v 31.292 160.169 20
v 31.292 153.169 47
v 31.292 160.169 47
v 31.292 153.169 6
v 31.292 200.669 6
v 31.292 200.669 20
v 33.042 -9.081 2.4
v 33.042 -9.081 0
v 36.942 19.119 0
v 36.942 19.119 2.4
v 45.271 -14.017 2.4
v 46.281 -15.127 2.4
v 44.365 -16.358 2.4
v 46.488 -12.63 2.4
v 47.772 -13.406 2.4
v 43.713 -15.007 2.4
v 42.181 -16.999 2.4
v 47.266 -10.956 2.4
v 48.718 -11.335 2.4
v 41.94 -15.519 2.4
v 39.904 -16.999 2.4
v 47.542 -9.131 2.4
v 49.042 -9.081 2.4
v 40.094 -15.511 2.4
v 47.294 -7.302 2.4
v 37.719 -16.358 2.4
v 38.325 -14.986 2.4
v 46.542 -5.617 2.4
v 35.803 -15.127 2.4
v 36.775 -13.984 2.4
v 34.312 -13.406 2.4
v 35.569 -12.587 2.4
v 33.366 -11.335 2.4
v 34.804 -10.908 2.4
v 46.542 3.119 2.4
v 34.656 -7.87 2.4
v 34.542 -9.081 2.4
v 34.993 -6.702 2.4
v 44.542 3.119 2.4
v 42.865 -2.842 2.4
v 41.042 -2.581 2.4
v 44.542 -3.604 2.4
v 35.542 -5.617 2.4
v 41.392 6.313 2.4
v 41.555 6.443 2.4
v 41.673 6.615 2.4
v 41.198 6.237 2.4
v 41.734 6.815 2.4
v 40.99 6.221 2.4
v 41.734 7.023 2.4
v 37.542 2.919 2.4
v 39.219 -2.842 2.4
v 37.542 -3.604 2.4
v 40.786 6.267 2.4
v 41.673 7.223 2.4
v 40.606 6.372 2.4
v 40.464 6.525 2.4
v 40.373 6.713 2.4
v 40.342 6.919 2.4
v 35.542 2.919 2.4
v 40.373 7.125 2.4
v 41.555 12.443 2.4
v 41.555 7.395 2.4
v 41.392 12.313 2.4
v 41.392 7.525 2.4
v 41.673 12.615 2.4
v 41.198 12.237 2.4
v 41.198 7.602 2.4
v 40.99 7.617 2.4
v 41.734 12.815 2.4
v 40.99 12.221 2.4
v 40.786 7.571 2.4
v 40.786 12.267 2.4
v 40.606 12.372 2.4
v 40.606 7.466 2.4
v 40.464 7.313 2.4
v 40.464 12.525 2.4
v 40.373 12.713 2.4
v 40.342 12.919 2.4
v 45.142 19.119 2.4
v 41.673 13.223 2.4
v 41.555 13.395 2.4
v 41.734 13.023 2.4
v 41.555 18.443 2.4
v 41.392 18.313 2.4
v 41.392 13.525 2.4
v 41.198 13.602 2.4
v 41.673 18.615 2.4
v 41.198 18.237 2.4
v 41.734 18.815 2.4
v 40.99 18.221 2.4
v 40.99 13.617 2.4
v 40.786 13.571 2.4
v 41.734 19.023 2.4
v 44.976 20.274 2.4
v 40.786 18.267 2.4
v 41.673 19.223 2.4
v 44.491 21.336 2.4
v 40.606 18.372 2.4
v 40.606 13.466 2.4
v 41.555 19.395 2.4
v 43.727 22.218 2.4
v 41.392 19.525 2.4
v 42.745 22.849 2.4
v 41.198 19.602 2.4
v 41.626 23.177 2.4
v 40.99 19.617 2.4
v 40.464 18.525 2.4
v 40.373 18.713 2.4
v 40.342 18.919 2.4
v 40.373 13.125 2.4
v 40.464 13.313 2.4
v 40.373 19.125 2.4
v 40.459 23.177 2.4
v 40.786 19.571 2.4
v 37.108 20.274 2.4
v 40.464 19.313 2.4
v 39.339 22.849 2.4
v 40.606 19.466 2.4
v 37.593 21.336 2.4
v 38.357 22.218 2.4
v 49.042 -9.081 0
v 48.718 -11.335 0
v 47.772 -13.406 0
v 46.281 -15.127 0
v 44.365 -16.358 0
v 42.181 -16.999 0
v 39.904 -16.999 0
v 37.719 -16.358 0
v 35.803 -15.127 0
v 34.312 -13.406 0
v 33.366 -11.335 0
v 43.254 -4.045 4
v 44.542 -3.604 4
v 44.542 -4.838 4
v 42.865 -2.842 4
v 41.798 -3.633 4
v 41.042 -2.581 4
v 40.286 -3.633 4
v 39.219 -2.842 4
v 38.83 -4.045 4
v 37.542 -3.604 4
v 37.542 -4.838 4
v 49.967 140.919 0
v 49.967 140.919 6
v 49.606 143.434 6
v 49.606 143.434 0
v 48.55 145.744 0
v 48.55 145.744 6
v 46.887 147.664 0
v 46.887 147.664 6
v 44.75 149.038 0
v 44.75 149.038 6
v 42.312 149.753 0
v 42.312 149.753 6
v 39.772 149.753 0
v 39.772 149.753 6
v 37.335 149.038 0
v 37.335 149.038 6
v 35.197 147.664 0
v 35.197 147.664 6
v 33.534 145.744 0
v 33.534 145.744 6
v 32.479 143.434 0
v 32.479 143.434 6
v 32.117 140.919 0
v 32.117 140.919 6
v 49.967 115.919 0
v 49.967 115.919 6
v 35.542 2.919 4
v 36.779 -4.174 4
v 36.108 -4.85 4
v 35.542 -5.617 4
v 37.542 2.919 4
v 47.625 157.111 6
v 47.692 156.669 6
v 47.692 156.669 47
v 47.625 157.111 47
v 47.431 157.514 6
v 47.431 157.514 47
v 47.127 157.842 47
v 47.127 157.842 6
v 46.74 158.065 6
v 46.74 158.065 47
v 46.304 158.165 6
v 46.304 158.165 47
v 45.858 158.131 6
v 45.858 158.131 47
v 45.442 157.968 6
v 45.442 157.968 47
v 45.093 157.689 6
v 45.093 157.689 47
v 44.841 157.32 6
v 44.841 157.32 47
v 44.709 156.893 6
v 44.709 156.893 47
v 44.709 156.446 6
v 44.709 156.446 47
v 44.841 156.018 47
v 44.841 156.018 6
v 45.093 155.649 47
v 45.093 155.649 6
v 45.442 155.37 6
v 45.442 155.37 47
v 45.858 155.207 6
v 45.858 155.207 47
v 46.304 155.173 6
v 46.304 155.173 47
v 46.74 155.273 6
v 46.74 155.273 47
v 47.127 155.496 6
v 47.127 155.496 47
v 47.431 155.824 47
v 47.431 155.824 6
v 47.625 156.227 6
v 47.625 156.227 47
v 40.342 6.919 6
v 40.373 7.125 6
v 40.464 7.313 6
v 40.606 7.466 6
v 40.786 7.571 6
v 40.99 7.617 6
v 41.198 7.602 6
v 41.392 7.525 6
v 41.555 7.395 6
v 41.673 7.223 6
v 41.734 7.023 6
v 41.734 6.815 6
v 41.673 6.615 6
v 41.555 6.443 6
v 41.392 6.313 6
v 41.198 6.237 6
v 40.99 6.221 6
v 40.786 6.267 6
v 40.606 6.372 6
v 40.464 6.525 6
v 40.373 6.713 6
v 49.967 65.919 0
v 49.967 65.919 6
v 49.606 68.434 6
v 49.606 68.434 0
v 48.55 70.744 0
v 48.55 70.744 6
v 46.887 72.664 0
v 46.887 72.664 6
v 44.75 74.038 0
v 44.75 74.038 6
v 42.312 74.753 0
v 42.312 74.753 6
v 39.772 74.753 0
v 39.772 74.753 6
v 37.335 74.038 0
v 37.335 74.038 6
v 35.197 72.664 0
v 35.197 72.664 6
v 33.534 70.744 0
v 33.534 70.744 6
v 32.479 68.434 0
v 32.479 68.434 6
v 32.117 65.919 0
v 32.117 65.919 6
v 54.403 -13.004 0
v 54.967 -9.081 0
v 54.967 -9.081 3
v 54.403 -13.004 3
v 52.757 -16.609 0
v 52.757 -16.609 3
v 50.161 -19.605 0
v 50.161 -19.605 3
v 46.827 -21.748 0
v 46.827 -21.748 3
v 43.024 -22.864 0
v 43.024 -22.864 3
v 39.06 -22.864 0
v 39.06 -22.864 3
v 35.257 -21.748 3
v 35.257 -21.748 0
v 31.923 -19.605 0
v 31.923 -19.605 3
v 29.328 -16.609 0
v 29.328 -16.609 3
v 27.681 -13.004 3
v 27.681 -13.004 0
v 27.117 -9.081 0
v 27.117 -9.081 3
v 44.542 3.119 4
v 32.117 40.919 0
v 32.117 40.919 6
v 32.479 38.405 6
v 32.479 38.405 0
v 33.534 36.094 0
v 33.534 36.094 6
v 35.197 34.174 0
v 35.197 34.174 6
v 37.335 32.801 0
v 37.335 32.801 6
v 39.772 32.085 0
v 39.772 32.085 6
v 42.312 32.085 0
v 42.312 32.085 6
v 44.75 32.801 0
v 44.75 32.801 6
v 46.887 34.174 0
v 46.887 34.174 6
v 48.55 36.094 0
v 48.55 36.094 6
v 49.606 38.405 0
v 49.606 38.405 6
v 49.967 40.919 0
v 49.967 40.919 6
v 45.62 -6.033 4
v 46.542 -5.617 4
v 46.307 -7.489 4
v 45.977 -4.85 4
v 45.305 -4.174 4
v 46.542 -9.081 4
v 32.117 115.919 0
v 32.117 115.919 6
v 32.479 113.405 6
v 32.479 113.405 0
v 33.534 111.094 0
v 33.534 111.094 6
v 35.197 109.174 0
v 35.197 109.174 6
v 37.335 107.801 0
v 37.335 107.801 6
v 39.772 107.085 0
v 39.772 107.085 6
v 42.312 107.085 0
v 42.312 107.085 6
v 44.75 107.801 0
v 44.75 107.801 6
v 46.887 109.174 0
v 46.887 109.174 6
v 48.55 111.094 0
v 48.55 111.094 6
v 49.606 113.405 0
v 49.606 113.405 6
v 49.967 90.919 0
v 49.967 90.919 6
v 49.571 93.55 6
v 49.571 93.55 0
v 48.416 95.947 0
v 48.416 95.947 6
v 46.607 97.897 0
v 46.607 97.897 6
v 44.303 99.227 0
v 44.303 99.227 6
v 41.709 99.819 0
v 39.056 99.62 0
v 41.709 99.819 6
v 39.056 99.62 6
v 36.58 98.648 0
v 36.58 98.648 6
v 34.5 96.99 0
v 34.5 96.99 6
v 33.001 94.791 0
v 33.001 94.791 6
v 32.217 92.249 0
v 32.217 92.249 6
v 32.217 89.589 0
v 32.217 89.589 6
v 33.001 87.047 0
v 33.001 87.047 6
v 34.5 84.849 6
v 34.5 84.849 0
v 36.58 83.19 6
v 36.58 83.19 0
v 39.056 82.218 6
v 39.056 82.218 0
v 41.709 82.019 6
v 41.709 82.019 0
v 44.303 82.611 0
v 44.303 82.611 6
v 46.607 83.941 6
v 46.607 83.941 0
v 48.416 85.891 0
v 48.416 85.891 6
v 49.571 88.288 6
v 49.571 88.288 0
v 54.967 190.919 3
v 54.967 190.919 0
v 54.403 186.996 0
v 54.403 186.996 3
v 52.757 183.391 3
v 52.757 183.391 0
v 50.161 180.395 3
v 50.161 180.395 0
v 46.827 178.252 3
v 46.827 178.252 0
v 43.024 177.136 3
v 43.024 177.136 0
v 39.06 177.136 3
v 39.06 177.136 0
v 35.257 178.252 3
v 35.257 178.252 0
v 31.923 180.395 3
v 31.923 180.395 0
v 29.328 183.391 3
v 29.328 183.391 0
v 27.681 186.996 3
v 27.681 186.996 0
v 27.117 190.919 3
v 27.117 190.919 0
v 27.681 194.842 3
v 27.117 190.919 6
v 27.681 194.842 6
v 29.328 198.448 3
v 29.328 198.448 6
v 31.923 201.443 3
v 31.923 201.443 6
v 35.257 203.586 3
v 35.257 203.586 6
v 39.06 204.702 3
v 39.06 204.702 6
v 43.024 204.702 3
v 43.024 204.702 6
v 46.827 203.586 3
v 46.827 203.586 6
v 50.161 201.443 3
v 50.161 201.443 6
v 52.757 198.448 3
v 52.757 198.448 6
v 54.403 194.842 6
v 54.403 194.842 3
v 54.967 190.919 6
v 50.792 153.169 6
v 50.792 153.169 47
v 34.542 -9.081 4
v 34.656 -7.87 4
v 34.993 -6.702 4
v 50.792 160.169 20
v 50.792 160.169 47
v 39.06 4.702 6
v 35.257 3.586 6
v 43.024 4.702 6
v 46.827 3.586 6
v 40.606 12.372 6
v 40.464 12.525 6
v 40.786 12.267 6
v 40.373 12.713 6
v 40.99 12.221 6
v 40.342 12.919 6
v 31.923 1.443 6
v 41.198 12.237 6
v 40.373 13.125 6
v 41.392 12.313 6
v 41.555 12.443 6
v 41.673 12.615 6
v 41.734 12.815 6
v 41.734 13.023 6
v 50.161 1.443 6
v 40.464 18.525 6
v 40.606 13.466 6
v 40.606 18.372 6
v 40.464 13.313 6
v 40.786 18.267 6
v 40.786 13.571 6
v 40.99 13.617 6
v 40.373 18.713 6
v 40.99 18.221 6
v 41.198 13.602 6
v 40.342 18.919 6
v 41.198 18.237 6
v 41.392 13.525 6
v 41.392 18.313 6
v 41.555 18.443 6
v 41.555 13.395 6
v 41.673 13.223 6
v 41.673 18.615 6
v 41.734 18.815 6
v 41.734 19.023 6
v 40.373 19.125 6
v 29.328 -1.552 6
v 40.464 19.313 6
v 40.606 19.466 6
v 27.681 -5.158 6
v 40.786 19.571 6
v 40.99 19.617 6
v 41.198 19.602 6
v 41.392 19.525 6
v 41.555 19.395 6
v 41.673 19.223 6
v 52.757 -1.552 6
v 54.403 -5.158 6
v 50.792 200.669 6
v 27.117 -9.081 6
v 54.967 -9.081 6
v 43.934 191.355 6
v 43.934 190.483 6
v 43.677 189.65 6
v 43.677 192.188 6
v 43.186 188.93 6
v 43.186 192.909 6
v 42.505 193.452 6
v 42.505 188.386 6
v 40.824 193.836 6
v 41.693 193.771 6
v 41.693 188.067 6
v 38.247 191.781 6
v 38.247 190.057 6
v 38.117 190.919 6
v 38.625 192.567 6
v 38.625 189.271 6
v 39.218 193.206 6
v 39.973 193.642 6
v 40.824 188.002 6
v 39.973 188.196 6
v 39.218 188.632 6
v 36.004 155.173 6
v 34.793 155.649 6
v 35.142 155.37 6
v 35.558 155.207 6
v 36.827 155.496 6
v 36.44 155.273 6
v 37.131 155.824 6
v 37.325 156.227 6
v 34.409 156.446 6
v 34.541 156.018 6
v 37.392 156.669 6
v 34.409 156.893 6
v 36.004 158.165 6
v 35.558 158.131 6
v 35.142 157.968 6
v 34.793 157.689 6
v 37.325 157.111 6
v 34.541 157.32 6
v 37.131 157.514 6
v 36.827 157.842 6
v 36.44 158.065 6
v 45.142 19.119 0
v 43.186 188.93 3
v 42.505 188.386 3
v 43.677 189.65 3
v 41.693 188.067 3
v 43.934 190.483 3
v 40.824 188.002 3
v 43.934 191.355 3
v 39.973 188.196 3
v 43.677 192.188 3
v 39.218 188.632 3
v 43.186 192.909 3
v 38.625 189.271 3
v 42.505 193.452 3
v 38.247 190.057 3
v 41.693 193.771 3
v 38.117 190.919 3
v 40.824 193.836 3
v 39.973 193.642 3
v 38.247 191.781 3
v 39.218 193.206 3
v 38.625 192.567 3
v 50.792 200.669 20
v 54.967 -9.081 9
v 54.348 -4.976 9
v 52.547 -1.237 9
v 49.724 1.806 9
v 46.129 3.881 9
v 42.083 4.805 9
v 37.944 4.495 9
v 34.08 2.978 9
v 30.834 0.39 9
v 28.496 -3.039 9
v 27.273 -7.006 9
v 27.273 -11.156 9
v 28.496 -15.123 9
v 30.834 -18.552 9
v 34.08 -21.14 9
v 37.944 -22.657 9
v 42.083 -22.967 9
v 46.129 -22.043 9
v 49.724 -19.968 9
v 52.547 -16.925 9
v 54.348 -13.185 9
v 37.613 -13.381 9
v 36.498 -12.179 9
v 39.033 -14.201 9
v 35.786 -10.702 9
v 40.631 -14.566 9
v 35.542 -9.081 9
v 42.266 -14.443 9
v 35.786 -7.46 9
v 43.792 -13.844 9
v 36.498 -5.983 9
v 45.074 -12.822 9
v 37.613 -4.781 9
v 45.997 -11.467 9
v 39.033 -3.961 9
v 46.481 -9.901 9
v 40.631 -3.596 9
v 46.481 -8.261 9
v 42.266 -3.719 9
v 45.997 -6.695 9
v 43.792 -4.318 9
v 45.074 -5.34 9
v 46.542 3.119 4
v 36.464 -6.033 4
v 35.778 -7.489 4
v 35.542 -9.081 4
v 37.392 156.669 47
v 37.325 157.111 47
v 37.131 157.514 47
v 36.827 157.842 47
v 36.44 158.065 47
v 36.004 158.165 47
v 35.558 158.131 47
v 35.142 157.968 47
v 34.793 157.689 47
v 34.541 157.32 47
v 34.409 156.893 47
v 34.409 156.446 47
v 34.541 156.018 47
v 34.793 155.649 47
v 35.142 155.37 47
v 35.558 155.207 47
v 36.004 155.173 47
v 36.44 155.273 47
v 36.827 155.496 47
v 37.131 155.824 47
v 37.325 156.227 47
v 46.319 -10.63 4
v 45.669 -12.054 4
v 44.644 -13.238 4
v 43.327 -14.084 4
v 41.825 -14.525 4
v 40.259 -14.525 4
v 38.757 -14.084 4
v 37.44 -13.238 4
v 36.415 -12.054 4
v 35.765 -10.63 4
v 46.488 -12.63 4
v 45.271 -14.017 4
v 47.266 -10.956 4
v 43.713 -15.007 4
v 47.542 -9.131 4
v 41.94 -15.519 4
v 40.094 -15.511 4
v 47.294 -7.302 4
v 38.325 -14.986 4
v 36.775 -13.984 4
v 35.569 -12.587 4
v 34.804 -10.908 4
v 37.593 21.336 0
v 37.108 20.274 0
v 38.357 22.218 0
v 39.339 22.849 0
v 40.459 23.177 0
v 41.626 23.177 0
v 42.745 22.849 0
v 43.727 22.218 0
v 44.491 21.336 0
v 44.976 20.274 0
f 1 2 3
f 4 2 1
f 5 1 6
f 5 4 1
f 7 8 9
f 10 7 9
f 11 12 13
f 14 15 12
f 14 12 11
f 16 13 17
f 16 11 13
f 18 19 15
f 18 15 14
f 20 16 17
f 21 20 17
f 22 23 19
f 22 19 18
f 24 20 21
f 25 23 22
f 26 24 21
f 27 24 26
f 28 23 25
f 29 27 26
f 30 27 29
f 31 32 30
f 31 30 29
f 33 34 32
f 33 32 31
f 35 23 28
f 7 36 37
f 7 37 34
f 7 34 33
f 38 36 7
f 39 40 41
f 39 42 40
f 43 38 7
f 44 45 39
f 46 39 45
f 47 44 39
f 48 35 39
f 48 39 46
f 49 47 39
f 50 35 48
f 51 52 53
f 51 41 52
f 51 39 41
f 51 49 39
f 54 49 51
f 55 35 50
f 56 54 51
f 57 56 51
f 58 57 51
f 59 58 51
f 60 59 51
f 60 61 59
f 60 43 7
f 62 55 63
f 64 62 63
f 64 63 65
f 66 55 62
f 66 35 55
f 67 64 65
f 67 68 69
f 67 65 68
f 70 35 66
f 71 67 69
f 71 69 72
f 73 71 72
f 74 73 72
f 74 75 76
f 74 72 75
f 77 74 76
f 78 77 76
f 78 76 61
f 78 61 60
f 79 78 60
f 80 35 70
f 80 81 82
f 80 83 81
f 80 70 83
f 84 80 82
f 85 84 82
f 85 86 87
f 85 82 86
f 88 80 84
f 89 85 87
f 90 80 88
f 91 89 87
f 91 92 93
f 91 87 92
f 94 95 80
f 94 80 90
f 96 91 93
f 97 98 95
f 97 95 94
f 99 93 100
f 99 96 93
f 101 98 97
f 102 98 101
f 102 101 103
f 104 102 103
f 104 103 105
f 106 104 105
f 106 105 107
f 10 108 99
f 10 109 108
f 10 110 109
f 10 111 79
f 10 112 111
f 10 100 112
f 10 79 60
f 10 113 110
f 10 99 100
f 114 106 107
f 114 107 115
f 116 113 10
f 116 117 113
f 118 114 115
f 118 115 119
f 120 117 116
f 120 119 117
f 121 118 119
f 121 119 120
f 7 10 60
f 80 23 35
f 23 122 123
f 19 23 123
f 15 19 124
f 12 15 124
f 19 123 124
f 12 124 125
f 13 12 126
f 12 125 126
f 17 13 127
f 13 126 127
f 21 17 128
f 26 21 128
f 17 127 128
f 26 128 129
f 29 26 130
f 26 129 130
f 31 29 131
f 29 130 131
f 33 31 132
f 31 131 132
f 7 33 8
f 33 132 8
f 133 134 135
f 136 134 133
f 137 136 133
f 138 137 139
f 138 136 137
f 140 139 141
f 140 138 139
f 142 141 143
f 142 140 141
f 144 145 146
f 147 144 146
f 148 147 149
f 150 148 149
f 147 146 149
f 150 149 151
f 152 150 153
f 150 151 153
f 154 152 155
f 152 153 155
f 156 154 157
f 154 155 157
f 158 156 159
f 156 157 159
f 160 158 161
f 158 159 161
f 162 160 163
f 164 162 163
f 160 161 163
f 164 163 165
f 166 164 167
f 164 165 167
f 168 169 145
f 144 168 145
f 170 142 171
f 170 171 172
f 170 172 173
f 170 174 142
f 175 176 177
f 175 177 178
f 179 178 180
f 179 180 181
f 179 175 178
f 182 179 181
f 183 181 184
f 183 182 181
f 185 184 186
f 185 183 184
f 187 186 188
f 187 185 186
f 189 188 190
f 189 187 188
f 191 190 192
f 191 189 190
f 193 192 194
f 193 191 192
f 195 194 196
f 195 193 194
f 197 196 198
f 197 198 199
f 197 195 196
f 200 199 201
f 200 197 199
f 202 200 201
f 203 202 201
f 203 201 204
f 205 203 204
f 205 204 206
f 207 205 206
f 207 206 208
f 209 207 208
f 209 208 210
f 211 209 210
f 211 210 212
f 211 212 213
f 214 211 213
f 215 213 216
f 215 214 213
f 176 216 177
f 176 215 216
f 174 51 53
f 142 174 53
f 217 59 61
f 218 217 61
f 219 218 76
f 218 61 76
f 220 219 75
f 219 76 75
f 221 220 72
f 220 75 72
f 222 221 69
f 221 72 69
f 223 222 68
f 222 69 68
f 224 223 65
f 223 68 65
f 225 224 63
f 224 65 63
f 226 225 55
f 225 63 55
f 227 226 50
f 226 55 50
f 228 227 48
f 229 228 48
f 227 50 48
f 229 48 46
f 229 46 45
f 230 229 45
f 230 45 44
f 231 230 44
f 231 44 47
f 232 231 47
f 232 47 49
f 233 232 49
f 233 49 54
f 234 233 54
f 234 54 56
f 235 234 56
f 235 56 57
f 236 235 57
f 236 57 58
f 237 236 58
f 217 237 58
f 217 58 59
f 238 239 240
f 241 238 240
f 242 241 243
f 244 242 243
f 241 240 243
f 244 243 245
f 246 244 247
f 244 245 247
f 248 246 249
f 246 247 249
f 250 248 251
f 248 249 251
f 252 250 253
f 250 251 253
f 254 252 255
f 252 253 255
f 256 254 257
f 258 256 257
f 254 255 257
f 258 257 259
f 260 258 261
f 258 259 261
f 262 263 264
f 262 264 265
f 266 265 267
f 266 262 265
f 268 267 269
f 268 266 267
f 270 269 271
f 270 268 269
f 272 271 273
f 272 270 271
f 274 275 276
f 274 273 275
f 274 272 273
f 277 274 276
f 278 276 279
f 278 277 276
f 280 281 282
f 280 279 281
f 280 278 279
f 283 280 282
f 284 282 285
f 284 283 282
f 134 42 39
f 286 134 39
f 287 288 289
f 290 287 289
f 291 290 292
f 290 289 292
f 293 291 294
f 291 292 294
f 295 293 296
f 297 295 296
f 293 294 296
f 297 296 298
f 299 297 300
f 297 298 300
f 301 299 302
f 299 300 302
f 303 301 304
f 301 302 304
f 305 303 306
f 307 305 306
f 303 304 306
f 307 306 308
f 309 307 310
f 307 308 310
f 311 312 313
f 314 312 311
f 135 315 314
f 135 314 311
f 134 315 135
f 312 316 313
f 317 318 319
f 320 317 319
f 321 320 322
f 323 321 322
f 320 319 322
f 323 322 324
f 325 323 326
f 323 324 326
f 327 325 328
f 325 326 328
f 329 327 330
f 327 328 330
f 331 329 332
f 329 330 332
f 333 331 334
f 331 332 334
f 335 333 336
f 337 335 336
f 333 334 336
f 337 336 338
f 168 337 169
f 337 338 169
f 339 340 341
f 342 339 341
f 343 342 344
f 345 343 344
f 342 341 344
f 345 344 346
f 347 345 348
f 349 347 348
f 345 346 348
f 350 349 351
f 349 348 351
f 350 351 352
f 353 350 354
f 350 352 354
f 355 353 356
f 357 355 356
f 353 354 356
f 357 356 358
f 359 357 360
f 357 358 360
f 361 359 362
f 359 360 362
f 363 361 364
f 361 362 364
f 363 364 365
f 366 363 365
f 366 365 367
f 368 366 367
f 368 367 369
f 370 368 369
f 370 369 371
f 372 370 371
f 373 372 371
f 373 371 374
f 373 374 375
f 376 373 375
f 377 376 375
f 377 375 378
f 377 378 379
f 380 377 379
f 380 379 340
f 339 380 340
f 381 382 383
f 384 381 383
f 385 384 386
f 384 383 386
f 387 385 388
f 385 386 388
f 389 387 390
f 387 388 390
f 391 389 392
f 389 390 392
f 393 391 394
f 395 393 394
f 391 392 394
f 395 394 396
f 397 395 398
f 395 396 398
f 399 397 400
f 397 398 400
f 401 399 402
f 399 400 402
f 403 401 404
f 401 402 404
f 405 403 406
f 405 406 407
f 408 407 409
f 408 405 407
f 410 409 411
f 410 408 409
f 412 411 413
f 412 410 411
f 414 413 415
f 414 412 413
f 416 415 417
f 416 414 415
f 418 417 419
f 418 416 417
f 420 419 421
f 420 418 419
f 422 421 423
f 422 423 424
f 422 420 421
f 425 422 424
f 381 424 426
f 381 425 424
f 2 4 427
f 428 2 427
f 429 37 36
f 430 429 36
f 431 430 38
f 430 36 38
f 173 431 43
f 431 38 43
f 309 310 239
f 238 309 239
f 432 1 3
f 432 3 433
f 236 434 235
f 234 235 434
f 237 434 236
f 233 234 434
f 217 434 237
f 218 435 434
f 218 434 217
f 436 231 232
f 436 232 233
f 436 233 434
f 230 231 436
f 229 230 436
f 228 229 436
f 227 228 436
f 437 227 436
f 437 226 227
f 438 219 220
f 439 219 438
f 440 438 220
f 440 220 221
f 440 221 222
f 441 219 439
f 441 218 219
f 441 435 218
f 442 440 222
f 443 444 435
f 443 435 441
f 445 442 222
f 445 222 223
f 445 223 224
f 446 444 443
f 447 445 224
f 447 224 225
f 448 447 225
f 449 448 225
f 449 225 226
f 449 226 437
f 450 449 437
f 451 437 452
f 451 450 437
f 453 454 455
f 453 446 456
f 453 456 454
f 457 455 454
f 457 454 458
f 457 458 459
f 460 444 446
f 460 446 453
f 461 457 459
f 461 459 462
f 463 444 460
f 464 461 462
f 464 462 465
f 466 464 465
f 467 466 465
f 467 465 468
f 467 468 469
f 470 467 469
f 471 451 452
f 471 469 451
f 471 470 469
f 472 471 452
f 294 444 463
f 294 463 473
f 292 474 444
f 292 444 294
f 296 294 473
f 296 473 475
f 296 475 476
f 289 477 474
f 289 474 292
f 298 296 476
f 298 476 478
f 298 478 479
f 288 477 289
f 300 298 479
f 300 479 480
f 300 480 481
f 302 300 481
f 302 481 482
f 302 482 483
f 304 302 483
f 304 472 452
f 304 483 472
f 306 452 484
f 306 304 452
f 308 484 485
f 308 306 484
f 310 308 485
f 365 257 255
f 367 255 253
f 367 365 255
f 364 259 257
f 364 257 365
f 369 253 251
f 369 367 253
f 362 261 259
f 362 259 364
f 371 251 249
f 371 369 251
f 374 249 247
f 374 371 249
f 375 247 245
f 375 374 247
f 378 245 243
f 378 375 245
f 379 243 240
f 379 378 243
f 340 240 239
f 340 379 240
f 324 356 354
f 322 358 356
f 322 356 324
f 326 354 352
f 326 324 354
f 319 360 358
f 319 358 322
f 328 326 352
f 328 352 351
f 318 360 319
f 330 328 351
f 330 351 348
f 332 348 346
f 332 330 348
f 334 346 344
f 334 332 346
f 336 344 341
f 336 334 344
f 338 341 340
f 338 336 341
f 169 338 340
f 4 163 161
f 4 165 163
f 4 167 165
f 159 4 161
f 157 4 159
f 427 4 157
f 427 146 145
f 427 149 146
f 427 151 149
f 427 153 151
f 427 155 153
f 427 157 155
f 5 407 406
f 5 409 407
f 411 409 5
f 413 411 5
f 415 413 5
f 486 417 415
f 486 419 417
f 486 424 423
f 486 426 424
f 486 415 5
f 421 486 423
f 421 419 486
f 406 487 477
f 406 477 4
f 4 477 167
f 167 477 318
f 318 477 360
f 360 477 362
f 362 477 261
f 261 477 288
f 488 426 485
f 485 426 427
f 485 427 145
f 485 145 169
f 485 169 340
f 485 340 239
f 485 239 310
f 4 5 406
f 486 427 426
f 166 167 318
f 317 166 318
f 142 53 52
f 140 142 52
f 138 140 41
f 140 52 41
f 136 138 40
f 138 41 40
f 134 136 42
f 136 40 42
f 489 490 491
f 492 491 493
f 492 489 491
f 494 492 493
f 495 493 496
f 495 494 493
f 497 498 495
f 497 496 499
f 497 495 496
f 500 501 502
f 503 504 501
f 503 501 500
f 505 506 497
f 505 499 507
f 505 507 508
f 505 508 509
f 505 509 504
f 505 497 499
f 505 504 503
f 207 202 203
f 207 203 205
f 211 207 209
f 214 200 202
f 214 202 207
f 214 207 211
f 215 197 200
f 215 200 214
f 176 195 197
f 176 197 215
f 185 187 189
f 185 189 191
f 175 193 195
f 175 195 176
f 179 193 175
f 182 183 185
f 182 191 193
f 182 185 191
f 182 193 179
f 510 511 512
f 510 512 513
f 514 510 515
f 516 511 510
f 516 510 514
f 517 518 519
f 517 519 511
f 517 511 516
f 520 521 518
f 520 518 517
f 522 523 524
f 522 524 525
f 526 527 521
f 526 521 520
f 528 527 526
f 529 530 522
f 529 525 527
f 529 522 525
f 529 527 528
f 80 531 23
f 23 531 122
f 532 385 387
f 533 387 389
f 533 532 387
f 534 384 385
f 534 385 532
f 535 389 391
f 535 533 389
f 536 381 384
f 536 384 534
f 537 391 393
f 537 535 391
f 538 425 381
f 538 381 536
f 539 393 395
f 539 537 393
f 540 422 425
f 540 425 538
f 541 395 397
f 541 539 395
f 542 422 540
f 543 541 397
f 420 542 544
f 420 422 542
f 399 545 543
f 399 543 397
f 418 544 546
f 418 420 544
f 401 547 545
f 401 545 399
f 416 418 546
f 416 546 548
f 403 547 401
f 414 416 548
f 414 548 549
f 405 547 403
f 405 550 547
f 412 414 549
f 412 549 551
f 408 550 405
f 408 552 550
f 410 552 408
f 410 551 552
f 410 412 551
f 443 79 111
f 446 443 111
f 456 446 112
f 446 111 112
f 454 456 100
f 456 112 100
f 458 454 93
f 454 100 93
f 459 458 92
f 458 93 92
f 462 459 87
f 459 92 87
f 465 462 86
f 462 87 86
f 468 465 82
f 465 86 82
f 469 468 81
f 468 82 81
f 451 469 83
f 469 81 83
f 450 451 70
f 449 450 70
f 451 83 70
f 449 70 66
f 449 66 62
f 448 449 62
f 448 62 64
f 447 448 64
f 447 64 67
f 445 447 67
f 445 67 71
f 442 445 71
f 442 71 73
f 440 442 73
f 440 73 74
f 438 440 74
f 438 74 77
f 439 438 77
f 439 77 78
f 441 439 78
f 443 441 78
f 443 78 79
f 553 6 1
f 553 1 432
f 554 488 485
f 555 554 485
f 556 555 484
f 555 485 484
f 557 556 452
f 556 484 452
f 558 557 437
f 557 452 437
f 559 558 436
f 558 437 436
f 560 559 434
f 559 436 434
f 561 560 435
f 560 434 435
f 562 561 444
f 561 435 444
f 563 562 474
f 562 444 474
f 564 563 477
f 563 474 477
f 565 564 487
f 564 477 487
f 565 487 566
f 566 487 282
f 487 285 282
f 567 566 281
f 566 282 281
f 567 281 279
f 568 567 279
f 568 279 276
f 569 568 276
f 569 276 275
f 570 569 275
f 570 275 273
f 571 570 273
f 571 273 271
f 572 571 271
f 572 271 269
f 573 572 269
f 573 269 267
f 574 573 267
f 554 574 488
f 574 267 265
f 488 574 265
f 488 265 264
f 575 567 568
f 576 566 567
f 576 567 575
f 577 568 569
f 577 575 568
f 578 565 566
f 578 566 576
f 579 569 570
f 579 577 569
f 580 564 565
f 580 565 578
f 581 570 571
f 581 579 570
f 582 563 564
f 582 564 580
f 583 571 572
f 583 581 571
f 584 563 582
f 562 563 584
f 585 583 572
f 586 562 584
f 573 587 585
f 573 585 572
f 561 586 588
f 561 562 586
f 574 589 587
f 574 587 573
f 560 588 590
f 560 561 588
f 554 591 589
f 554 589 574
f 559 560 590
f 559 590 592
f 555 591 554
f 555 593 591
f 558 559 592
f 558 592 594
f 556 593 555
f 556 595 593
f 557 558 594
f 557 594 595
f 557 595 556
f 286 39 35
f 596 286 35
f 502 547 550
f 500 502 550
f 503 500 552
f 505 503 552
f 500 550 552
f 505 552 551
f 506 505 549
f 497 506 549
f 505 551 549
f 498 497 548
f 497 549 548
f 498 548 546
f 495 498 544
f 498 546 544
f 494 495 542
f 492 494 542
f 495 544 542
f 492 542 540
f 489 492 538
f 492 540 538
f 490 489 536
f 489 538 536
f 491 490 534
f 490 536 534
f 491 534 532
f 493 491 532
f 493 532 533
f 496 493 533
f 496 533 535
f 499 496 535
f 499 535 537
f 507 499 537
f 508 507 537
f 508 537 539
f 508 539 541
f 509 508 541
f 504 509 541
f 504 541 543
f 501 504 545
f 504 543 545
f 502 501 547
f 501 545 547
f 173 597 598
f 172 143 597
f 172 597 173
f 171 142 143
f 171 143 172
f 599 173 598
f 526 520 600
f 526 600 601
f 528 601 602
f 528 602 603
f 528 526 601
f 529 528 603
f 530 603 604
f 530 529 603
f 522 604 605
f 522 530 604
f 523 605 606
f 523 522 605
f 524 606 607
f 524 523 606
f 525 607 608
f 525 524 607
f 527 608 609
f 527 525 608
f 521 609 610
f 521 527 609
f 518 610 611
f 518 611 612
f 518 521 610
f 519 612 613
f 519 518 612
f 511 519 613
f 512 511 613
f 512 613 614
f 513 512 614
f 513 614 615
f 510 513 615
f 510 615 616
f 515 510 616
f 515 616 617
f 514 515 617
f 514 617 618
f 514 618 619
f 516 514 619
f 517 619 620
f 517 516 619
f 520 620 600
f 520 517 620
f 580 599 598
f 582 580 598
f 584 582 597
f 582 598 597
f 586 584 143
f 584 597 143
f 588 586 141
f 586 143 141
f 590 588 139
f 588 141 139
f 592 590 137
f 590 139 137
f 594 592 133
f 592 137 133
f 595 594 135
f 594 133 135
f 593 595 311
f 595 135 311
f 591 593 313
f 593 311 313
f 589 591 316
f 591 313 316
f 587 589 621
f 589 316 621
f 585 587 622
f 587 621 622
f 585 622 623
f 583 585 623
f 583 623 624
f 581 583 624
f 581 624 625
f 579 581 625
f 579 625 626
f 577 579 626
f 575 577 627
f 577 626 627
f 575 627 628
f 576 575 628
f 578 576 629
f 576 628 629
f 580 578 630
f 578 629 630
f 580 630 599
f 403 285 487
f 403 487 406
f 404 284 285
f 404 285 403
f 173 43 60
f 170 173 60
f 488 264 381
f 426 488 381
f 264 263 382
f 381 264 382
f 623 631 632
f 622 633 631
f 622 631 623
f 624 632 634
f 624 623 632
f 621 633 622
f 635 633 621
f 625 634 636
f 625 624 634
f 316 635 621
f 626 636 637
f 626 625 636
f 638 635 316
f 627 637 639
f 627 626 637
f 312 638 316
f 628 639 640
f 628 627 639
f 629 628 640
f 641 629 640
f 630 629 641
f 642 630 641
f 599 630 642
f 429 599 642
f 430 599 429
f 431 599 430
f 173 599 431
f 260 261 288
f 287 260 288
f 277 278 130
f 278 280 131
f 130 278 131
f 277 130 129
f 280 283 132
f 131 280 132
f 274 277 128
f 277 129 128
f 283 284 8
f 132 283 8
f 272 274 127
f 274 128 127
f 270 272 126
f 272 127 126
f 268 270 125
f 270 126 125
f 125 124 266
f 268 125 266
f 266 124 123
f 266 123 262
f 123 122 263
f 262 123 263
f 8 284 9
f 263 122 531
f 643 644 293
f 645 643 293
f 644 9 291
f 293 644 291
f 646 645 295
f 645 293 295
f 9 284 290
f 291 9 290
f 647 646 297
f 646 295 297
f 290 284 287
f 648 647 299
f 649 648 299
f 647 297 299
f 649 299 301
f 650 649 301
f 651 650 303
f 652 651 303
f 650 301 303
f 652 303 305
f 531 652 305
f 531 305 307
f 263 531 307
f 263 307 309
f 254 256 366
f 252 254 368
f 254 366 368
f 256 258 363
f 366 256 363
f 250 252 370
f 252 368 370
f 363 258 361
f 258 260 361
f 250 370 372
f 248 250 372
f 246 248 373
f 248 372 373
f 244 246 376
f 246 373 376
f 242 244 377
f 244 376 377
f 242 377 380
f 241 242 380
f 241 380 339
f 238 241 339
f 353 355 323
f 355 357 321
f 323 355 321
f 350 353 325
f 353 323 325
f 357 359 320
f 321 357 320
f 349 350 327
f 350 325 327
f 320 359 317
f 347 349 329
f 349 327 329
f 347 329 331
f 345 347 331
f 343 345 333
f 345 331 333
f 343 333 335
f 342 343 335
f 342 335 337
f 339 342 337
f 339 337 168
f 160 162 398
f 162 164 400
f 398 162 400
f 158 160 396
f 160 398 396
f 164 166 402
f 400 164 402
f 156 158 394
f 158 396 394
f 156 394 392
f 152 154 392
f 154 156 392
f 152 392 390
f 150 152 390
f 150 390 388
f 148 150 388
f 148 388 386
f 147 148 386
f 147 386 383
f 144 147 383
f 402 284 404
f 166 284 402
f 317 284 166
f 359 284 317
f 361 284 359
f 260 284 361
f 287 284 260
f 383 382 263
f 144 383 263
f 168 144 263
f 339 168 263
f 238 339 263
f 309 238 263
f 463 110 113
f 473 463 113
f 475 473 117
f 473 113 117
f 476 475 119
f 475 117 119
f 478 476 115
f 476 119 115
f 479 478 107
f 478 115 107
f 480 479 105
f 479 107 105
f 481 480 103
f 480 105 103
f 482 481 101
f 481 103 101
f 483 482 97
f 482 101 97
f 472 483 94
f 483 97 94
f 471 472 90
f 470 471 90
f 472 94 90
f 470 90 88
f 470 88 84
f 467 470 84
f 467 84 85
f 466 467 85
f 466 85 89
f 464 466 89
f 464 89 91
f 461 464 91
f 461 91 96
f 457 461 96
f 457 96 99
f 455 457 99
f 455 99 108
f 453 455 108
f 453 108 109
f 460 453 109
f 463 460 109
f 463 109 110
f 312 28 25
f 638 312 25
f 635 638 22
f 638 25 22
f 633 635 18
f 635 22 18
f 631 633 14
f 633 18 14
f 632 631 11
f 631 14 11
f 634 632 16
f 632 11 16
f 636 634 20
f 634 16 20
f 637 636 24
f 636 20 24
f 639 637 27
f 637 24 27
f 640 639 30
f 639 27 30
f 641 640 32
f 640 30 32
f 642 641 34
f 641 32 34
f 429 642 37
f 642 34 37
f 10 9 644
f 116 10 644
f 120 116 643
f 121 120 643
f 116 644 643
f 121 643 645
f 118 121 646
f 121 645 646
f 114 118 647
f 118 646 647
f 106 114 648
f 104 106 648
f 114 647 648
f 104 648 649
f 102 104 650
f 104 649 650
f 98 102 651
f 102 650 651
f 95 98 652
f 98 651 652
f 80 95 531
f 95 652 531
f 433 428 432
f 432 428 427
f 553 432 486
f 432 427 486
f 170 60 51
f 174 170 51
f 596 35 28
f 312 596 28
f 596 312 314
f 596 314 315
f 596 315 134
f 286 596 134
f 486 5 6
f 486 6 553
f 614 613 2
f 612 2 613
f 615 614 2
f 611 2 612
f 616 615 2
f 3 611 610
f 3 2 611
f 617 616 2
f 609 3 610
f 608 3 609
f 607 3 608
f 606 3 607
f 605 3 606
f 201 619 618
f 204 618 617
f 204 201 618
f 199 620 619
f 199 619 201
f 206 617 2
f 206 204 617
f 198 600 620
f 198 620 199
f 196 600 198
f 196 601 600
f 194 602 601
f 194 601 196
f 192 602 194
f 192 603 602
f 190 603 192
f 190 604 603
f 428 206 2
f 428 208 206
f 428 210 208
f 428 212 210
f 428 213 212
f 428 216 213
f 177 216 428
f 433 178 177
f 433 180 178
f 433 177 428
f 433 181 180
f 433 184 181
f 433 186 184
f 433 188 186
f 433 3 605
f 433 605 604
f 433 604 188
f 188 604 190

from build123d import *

# Parameters (mm, degrees)
ESQUISSE1_W              = 27.85
ESQUISSE1_H              = 200
BOSS_EXTRU_1_DEPTH       = 6
ENL_V_START              = -3
ESQUISSE2_R              = 13.925
ENL_V_MAT_EXTRU_1_DEPTH  = 3
ESQUISSE3_R              = 13.925
ENL_V_MAT_EXTRU_2_DEPTH  = 3
ESQUISSE5_R              = 8.925
ENL_V_MAT_EXTRU_3_DEPTH  = 10
ESQUISSE4_W              = 19.5
ESQUISSE4_H              = 40.5
ESQUISSE4_R              = 2.5
BOSS_EXTRU_2_DEPTH       = 14
ESQUISSE6_W              = 19.5
ESQUISSE6_H              = 7
ESQUISSE6_R              = 1.5
BOSS_EXTRU_3_DEPTH       = 41
ESQUISSE7_R              = 2.925
ENL_V_MAT_EXTRU_4_DEPTH  = 10
ESQUISSE8_R              = 2.925
ENL_V_MAT_EXTRU_5_DEPTH  = 3
ESQUISSE9_R              = 13.925
BOSS_EXTRU_4_DEPTH       = 6
ENL_V_START_2            = -6
ESQUISSE10_R             = 2.925
ENL_V_MAT_EXTRU_6_DEPTH  = 6
ESQUISSE11_R             = 2.925
ENL_V_MAT_EXTRU_7_DEPTH  = 2.4
ESQUISSE12_R             = 5.5
ESQUISSE12_R_2           = 2.925
ENL_V_MAT_EXTRU_9_DEPTH  = 1.6
ESQUISSE13_R             = 5.5
ENL_V_MAT_EXTRU_10_DEPTH = 5
ESQUISSE14_R             = 0.7
ENL_V_MAT_EXTRU_11_DEPTH = 45


with BuildPart() as part:
    # Esquisse1 → Boss.-Extru.1 (new body)
    with BuildSketch(Plane.XY):
        with Locations((41.042105263, 90.919078947)):
            Rectangle(ESQUISSE1_W, ESQUISSE1_H)
        with BuildLine():
            Line((27.117105263, -9.080921053), (54.967105263, -9.080921053))
            ThreePointArc((54.967105263, -9.080921053), (41.042105263, -23.005921053), (27.117105263, -9.080921053))
        make_face()
        with BuildLine():
            ThreePointArc((27.117105263, 190.919078947), (41.042105263, 204.844078947), (54.967105263, 190.919078947))
            Line((54.967105263, 190.919078947), (27.117105263, 190.919078947))
        make_face()
    extrude(amount=BOSS_EXTRU_1_DEPTH)

    # Esquisse2 → Enlèv. mat.-Extru.1 (cut)
    with BuildSketch(Plane.XY.offset(6).offset(ENL_V_START)):
        with Locations((41.042105263, -9.080921053)):
            Circle(ESQUISSE2_R)
    extrude(amount=ENL_V_MAT_EXTRU_1_DEPTH, mode=Mode.SUBTRACT)

    # Esquisse3 → Enlèv. mat.-Extru.2 (cut)
    with BuildSketch(Plane(origin=(0, 0, 0), x_dir=(-1, 0, 0), z_dir=(0, 0, -1))):
        with Locations((-41.042105263, 190.919078947)):
            Circle(ESQUISSE3_R)
    extrude(amount=-ENL_V_MAT_EXTRU_2_DEPTH, mode=Mode.SUBTRACT)

    # Esquisse5 → Enlèv. mat.-Extru.3 (cut)
    with BuildSketch(Plane.XY.offset(6)):
        with Locations((41.042105263, 90.919078947)):
            Circle(ESQUISSE5_R)
        with BuildLine():
            Line((32.117105263, 65.919078947), (32.117105263, 40.919078947))
            ThreePointArc((32.117105263, 40.919078947), (41.042105263, 31.994078947), (49.967105263, 40.919078947))
            Line((49.967105263, 40.919078947), (49.967105263, 65.919078947))
            ThreePointArc((49.967105263, 65.919078947), (41.042105263, 74.844078947), (32.117105263, 65.919078947))
        make_face()
        with BuildLine():
            Line((32.117105263, 140.919078947), (32.117105263, 115.919078947))
            ThreePointArc((32.117105263, 115.919078947), (41.042105263, 106.994078947), (49.967105263, 115.919078947))
            Line((49.967105263, 115.919078947), (49.967105263, 140.919078947))
            ThreePointArc((49.967105263, 140.919078947), (41.042105263, 149.844078947), (32.117105263, 140.919078947))
        make_face()
    extrude(amount=-ENL_V_MAT_EXTRU_3_DEPTH, mode=Mode.SUBTRACT)

    # Esquisse4 → Boss.-Extru.2 (add)
    # profile 1 of 2: a face of its own
    with BuildSketch(Plane.XY.offset(6)):
        with Locations((41.042105263, 180.419078947)):
            Rectangle(ESQUISSE4_W, ESQUISSE4_H)
        with Locations((41.042105263, 190.919078947)):
            Circle(ESQUISSE4_R, mode=Mode.SUBTRACT)
    # profile 2 of 2: a face of its own
    with BuildSketch(Plane.XY.offset(6)):
        with Locations((41.042105263, 190.919078947)):
            Circle(ESQUISSE4_R)
    extrude(amount=BOSS_EXTRU_2_DEPTH)

    # Esquisse6 → Boss.-Extru.3 (add)
    with BuildSketch(Plane.XY.offset(6)):
        with Locations((41.042105263, 156.669078947)):
            Rectangle(ESQUISSE6_W, ESQUISSE6_H)
        with Locations((35.892105263, 156.669078947)):
            Circle(ESQUISSE6_R, mode=Mode.SUBTRACT)
        with Locations((46.192105263, 156.669078947)):
            Circle(ESQUISSE6_R, mode=Mode.SUBTRACT)
    extrude(amount=BOSS_EXTRU_3_DEPTH)

    # Esquisse7 → Enlèv. mat.-Extru.4 (cut)
    with BuildSketch(Plane(origin=(0, 0, 0), x_dir=(-1, 0, 0), z_dir=(0, 0, -1))):
        with Locations((-41.042105263, -9.080921053)):
            Circle(ESQUISSE7_R)
    extrude(amount=-ENL_V_MAT_EXTRU_4_DEPTH, mode=Mode.SUBTRACT)

    # Esquisse8 → Enlèv. mat.-Extru.5 (cut)
    with BuildSketch(Plane(origin=(0, 0, 3), x_dir=(-1, 0, 0), z_dir=(0, 0, -1))):
        with Locations((-41.042105263, 190.919078947)):
            Circle(ESQUISSE8_R)
    extrude(amount=-ENL_V_MAT_EXTRU_5_DEPTH, mode=Mode.SUBTRACT)

    # Esquisse9 → Boss.-Extru.4 (add)
    with BuildSketch(Plane.XY.offset(3)):
        with Locations((41.042105263, -9.080921053)):
            Circle(ESQUISSE9_R)
    extrude(amount=BOSS_EXTRU_4_DEPTH)

    # Esquisse10 → Enlèv. mat.-Extru.6 (cut)
    with BuildSketch(Plane.XY.offset(9).offset(ENL_V_START_2)):
        with Locations(Location((41.042105263, -9.080921053, 0), (0, 0, 180))):
            Circle(ESQUISSE10_R)
    extrude(amount=ENL_V_MAT_EXTRU_6_DEPTH, mode=Mode.SUBTRACT)

    # Esquisse11 → Enlèv. mat.-Extru.7 (cut)
    with BuildSketch(Plane(origin=(0, 0, 0), x_dir=(-1, 0, 0), z_dir=(0, 0, -1))):
        with BuildLine():
            Line((-33.042105263, -9.080921053), (-36.942105263, 19.119078947))
            ThreePointArc((-36.942105263, 19.119078947), (-41.042105263, 23.219078947), (-45.142105263, 19.119078947))
            Line((-45.142105263, 19.119078947), (-49.042105263, -9.080921053))
            ThreePointArc((-49.042105263, -9.080921053), (-41.042105263, -17.080921053), (-33.042105263, -9.080921053))
        make_face()
        with Locations((-41.042105263, -9.080921053)):
            Circle(ESQUISSE11_R, mode=Mode.SUBTRACT)
    extrude(amount=-ENL_V_MAT_EXTRU_7_DEPTH, mode=Mode.SUBTRACT)

    # Esquisse12 → Enlèv. mat.-Extru.9 (cut)
    # profile 1 of 7: a face of its own
    with BuildSketch(Plane(origin=(0, 0, 2.4), x_dir=(-1, 0, 0), z_dir=(0, 0, -1))):
        with BuildLine():
            Line((-46.542105263, 3.119078947), (-46.542105263, -5.616819437))
            ThreePointArc((-46.542105263, -5.616819437), (-45.653305434, -4.499782223), (-44.542105263, -3.603695478))
            Line((-44.542105263, -3.603695478), (-44.542105263, 3.119078947))
            Line((-44.542105263, 3.119078947), (-46.542105263, 3.119078947))
        make_face()
    # profile 2 of 7: a face of its own
    with BuildSketch(Plane(origin=(0, 0, 2.4), x_dir=(-1, 0, 0), z_dir=(0, 0, -1))):
        with BuildLine():
            ThreePointArc((-37.542105263, -3.603695478), (-36.430905092, -4.499782223), (-35.542105263, -5.616819437))
            Line((-35.542105263, -5.616819437), (-35.542105263, 2.919078947))
            Line((-35.542105263, 2.919078947), (-37.542105263, 2.919078947))
            Line((-37.542105263, 2.919078947), (-37.542105263, -3.603695478))
        make_face()
    # profile 3 of 7: a face of its own
    with BuildSketch(Plane(origin=(0, 0, 2.4), x_dir=(-1, 0, 0), z_dir=(0, 0, -1))):
        with BuildLine():
            ThreePointArc((-37.542105263, -4.838280366), (-36.067168078, -6.735713173), (-35.542105263, -9.080921053))
            Line((-35.542105263, -9.080921053), (-35.542105263, -5.616819437))
            ThreePointArc((-35.542105263, -5.616819437), (-36.430905092, -4.499782223), (-37.542105263, -3.603695478))
            Line((-37.542105263, -3.603695478), (-37.542105263, -4.838280366))
        make_face()
    # profile 4 of 7: a face of its own
    with BuildSketch(Plane(origin=(0, 0, 2.4), x_dir=(-1, 0, 0), z_dir=(0, 0, -1))):
        with BuildLine():
            ThreePointArc((-35.542105263, -9.080921053), (-41.042105263, -14.580921053), (-46.542105263, -9.080921053))
            Line((-46.542105263, -9.080921053), (-46.542105263, -5.616819437))
            ThreePointArc((-46.542105263, -5.616819437), (-42.844880901, -15.325919051), (-34.542105263, -9.080921053))
            ThreePointArc((-34.542105263, -9.080921053), (-34.797107265, -7.278145415), (-35.542105263, -5.616819437))
            Line((-35.542105263, -5.616819437), (-35.542105263, -9.080921053))
        make_face()
    # profile 5 of 7: a face of its own
    with BuildSketch(Plane(origin=(0, 0, 2.4), x_dir=(-1, 0, 0), z_dir=(0, 0, -1))):
        with BuildLine():
            Line((-46.542105263, -5.616819437), (-46.542105263, -9.080921053))
            ThreePointArc((-46.542105263, -9.080921053), (-46.017042449, -6.735713173), (-44.542105263, -4.838280366))
            Line((-44.542105263, -4.838280366), (-44.542105263, -3.603695478))
            ThreePointArc((-44.542105263, -3.603695478), (-45.653305434, -4.499782223), (-46.542105263, -5.616819437))
        make_face()
    # profile 6 of 7: a face of its own
    with BuildSketch(Plane(origin=(0, 0, 2.4), x_dir=(-1, 0, 0), z_dir=(0, 0, -1))):
        with BuildLine():
            Line((-44.542105263, -3.603695478), (-44.542105263, -4.838280366))
            ThreePointArc((-44.542105263, -4.838280366), (-41.042105263, -3.580921053), (-37.542105263, -4.838280366))
            Line((-37.542105263, -4.838280366), (-37.542105263, -3.603695478))
            ThreePointArc((-37.542105263, -3.603695478), (-41.042105263, -2.580921053), (-44.542105263, -3.603695478))
        make_face()
    # profile 7 of 7: a face of its own
    with BuildSketch(Plane(origin=(0, 0, 2.4), x_dir=(-1, 0, 0), z_dir=(0, 0, -1))):
        with Locations((-41.042105263, -9.080921053)):
            Circle(ESQUISSE12_R)
        with Locations((-41.042105263, -9.080921053)):
            Circle(ESQUISSE12_R_2, mode=Mode.SUBTRACT)
    extrude(amount=-ENL_V_MAT_EXTRU_9_DEPTH, mode=Mode.SUBTRACT)

    # Esquisse13 → Enlèv. mat.-Extru.10 (cut)
    with BuildSketch(Plane(origin=(0, 0, 4), x_dir=(-1, 0, 0), z_dir=(0, 0, -1))):
        with Locations((-41.042105263, -9.080921053)):
            Circle(ESQUISSE13_R)
    extrude(amount=-ENL_V_MAT_EXTRU_10_DEPTH, mode=Mode.SUBTRACT)

    # Esquisse14 → Enlèv. mat.-Extru.11 (cut)
    with BuildSketch(Plane(origin=(0, 0, 2.4), x_dir=(-1, 0, 0), z_dir=(0, 0, -1))):
        with Locations((-41.042105263, 6.919078947)):
            Circle(ESQUISSE14_R)
        with Locations((-41.042105263, 12.919078947)):
            Circle(ESQUISSE14_R)
        with Locations((-41.042105263, 18.919078947)):
            Circle(ESQUISSE14_R)
    extrude(amount=-ENL_V_MAT_EXTRU_11_DEPTH, mode=Mode.SUBTRACT)


solid = part.part
